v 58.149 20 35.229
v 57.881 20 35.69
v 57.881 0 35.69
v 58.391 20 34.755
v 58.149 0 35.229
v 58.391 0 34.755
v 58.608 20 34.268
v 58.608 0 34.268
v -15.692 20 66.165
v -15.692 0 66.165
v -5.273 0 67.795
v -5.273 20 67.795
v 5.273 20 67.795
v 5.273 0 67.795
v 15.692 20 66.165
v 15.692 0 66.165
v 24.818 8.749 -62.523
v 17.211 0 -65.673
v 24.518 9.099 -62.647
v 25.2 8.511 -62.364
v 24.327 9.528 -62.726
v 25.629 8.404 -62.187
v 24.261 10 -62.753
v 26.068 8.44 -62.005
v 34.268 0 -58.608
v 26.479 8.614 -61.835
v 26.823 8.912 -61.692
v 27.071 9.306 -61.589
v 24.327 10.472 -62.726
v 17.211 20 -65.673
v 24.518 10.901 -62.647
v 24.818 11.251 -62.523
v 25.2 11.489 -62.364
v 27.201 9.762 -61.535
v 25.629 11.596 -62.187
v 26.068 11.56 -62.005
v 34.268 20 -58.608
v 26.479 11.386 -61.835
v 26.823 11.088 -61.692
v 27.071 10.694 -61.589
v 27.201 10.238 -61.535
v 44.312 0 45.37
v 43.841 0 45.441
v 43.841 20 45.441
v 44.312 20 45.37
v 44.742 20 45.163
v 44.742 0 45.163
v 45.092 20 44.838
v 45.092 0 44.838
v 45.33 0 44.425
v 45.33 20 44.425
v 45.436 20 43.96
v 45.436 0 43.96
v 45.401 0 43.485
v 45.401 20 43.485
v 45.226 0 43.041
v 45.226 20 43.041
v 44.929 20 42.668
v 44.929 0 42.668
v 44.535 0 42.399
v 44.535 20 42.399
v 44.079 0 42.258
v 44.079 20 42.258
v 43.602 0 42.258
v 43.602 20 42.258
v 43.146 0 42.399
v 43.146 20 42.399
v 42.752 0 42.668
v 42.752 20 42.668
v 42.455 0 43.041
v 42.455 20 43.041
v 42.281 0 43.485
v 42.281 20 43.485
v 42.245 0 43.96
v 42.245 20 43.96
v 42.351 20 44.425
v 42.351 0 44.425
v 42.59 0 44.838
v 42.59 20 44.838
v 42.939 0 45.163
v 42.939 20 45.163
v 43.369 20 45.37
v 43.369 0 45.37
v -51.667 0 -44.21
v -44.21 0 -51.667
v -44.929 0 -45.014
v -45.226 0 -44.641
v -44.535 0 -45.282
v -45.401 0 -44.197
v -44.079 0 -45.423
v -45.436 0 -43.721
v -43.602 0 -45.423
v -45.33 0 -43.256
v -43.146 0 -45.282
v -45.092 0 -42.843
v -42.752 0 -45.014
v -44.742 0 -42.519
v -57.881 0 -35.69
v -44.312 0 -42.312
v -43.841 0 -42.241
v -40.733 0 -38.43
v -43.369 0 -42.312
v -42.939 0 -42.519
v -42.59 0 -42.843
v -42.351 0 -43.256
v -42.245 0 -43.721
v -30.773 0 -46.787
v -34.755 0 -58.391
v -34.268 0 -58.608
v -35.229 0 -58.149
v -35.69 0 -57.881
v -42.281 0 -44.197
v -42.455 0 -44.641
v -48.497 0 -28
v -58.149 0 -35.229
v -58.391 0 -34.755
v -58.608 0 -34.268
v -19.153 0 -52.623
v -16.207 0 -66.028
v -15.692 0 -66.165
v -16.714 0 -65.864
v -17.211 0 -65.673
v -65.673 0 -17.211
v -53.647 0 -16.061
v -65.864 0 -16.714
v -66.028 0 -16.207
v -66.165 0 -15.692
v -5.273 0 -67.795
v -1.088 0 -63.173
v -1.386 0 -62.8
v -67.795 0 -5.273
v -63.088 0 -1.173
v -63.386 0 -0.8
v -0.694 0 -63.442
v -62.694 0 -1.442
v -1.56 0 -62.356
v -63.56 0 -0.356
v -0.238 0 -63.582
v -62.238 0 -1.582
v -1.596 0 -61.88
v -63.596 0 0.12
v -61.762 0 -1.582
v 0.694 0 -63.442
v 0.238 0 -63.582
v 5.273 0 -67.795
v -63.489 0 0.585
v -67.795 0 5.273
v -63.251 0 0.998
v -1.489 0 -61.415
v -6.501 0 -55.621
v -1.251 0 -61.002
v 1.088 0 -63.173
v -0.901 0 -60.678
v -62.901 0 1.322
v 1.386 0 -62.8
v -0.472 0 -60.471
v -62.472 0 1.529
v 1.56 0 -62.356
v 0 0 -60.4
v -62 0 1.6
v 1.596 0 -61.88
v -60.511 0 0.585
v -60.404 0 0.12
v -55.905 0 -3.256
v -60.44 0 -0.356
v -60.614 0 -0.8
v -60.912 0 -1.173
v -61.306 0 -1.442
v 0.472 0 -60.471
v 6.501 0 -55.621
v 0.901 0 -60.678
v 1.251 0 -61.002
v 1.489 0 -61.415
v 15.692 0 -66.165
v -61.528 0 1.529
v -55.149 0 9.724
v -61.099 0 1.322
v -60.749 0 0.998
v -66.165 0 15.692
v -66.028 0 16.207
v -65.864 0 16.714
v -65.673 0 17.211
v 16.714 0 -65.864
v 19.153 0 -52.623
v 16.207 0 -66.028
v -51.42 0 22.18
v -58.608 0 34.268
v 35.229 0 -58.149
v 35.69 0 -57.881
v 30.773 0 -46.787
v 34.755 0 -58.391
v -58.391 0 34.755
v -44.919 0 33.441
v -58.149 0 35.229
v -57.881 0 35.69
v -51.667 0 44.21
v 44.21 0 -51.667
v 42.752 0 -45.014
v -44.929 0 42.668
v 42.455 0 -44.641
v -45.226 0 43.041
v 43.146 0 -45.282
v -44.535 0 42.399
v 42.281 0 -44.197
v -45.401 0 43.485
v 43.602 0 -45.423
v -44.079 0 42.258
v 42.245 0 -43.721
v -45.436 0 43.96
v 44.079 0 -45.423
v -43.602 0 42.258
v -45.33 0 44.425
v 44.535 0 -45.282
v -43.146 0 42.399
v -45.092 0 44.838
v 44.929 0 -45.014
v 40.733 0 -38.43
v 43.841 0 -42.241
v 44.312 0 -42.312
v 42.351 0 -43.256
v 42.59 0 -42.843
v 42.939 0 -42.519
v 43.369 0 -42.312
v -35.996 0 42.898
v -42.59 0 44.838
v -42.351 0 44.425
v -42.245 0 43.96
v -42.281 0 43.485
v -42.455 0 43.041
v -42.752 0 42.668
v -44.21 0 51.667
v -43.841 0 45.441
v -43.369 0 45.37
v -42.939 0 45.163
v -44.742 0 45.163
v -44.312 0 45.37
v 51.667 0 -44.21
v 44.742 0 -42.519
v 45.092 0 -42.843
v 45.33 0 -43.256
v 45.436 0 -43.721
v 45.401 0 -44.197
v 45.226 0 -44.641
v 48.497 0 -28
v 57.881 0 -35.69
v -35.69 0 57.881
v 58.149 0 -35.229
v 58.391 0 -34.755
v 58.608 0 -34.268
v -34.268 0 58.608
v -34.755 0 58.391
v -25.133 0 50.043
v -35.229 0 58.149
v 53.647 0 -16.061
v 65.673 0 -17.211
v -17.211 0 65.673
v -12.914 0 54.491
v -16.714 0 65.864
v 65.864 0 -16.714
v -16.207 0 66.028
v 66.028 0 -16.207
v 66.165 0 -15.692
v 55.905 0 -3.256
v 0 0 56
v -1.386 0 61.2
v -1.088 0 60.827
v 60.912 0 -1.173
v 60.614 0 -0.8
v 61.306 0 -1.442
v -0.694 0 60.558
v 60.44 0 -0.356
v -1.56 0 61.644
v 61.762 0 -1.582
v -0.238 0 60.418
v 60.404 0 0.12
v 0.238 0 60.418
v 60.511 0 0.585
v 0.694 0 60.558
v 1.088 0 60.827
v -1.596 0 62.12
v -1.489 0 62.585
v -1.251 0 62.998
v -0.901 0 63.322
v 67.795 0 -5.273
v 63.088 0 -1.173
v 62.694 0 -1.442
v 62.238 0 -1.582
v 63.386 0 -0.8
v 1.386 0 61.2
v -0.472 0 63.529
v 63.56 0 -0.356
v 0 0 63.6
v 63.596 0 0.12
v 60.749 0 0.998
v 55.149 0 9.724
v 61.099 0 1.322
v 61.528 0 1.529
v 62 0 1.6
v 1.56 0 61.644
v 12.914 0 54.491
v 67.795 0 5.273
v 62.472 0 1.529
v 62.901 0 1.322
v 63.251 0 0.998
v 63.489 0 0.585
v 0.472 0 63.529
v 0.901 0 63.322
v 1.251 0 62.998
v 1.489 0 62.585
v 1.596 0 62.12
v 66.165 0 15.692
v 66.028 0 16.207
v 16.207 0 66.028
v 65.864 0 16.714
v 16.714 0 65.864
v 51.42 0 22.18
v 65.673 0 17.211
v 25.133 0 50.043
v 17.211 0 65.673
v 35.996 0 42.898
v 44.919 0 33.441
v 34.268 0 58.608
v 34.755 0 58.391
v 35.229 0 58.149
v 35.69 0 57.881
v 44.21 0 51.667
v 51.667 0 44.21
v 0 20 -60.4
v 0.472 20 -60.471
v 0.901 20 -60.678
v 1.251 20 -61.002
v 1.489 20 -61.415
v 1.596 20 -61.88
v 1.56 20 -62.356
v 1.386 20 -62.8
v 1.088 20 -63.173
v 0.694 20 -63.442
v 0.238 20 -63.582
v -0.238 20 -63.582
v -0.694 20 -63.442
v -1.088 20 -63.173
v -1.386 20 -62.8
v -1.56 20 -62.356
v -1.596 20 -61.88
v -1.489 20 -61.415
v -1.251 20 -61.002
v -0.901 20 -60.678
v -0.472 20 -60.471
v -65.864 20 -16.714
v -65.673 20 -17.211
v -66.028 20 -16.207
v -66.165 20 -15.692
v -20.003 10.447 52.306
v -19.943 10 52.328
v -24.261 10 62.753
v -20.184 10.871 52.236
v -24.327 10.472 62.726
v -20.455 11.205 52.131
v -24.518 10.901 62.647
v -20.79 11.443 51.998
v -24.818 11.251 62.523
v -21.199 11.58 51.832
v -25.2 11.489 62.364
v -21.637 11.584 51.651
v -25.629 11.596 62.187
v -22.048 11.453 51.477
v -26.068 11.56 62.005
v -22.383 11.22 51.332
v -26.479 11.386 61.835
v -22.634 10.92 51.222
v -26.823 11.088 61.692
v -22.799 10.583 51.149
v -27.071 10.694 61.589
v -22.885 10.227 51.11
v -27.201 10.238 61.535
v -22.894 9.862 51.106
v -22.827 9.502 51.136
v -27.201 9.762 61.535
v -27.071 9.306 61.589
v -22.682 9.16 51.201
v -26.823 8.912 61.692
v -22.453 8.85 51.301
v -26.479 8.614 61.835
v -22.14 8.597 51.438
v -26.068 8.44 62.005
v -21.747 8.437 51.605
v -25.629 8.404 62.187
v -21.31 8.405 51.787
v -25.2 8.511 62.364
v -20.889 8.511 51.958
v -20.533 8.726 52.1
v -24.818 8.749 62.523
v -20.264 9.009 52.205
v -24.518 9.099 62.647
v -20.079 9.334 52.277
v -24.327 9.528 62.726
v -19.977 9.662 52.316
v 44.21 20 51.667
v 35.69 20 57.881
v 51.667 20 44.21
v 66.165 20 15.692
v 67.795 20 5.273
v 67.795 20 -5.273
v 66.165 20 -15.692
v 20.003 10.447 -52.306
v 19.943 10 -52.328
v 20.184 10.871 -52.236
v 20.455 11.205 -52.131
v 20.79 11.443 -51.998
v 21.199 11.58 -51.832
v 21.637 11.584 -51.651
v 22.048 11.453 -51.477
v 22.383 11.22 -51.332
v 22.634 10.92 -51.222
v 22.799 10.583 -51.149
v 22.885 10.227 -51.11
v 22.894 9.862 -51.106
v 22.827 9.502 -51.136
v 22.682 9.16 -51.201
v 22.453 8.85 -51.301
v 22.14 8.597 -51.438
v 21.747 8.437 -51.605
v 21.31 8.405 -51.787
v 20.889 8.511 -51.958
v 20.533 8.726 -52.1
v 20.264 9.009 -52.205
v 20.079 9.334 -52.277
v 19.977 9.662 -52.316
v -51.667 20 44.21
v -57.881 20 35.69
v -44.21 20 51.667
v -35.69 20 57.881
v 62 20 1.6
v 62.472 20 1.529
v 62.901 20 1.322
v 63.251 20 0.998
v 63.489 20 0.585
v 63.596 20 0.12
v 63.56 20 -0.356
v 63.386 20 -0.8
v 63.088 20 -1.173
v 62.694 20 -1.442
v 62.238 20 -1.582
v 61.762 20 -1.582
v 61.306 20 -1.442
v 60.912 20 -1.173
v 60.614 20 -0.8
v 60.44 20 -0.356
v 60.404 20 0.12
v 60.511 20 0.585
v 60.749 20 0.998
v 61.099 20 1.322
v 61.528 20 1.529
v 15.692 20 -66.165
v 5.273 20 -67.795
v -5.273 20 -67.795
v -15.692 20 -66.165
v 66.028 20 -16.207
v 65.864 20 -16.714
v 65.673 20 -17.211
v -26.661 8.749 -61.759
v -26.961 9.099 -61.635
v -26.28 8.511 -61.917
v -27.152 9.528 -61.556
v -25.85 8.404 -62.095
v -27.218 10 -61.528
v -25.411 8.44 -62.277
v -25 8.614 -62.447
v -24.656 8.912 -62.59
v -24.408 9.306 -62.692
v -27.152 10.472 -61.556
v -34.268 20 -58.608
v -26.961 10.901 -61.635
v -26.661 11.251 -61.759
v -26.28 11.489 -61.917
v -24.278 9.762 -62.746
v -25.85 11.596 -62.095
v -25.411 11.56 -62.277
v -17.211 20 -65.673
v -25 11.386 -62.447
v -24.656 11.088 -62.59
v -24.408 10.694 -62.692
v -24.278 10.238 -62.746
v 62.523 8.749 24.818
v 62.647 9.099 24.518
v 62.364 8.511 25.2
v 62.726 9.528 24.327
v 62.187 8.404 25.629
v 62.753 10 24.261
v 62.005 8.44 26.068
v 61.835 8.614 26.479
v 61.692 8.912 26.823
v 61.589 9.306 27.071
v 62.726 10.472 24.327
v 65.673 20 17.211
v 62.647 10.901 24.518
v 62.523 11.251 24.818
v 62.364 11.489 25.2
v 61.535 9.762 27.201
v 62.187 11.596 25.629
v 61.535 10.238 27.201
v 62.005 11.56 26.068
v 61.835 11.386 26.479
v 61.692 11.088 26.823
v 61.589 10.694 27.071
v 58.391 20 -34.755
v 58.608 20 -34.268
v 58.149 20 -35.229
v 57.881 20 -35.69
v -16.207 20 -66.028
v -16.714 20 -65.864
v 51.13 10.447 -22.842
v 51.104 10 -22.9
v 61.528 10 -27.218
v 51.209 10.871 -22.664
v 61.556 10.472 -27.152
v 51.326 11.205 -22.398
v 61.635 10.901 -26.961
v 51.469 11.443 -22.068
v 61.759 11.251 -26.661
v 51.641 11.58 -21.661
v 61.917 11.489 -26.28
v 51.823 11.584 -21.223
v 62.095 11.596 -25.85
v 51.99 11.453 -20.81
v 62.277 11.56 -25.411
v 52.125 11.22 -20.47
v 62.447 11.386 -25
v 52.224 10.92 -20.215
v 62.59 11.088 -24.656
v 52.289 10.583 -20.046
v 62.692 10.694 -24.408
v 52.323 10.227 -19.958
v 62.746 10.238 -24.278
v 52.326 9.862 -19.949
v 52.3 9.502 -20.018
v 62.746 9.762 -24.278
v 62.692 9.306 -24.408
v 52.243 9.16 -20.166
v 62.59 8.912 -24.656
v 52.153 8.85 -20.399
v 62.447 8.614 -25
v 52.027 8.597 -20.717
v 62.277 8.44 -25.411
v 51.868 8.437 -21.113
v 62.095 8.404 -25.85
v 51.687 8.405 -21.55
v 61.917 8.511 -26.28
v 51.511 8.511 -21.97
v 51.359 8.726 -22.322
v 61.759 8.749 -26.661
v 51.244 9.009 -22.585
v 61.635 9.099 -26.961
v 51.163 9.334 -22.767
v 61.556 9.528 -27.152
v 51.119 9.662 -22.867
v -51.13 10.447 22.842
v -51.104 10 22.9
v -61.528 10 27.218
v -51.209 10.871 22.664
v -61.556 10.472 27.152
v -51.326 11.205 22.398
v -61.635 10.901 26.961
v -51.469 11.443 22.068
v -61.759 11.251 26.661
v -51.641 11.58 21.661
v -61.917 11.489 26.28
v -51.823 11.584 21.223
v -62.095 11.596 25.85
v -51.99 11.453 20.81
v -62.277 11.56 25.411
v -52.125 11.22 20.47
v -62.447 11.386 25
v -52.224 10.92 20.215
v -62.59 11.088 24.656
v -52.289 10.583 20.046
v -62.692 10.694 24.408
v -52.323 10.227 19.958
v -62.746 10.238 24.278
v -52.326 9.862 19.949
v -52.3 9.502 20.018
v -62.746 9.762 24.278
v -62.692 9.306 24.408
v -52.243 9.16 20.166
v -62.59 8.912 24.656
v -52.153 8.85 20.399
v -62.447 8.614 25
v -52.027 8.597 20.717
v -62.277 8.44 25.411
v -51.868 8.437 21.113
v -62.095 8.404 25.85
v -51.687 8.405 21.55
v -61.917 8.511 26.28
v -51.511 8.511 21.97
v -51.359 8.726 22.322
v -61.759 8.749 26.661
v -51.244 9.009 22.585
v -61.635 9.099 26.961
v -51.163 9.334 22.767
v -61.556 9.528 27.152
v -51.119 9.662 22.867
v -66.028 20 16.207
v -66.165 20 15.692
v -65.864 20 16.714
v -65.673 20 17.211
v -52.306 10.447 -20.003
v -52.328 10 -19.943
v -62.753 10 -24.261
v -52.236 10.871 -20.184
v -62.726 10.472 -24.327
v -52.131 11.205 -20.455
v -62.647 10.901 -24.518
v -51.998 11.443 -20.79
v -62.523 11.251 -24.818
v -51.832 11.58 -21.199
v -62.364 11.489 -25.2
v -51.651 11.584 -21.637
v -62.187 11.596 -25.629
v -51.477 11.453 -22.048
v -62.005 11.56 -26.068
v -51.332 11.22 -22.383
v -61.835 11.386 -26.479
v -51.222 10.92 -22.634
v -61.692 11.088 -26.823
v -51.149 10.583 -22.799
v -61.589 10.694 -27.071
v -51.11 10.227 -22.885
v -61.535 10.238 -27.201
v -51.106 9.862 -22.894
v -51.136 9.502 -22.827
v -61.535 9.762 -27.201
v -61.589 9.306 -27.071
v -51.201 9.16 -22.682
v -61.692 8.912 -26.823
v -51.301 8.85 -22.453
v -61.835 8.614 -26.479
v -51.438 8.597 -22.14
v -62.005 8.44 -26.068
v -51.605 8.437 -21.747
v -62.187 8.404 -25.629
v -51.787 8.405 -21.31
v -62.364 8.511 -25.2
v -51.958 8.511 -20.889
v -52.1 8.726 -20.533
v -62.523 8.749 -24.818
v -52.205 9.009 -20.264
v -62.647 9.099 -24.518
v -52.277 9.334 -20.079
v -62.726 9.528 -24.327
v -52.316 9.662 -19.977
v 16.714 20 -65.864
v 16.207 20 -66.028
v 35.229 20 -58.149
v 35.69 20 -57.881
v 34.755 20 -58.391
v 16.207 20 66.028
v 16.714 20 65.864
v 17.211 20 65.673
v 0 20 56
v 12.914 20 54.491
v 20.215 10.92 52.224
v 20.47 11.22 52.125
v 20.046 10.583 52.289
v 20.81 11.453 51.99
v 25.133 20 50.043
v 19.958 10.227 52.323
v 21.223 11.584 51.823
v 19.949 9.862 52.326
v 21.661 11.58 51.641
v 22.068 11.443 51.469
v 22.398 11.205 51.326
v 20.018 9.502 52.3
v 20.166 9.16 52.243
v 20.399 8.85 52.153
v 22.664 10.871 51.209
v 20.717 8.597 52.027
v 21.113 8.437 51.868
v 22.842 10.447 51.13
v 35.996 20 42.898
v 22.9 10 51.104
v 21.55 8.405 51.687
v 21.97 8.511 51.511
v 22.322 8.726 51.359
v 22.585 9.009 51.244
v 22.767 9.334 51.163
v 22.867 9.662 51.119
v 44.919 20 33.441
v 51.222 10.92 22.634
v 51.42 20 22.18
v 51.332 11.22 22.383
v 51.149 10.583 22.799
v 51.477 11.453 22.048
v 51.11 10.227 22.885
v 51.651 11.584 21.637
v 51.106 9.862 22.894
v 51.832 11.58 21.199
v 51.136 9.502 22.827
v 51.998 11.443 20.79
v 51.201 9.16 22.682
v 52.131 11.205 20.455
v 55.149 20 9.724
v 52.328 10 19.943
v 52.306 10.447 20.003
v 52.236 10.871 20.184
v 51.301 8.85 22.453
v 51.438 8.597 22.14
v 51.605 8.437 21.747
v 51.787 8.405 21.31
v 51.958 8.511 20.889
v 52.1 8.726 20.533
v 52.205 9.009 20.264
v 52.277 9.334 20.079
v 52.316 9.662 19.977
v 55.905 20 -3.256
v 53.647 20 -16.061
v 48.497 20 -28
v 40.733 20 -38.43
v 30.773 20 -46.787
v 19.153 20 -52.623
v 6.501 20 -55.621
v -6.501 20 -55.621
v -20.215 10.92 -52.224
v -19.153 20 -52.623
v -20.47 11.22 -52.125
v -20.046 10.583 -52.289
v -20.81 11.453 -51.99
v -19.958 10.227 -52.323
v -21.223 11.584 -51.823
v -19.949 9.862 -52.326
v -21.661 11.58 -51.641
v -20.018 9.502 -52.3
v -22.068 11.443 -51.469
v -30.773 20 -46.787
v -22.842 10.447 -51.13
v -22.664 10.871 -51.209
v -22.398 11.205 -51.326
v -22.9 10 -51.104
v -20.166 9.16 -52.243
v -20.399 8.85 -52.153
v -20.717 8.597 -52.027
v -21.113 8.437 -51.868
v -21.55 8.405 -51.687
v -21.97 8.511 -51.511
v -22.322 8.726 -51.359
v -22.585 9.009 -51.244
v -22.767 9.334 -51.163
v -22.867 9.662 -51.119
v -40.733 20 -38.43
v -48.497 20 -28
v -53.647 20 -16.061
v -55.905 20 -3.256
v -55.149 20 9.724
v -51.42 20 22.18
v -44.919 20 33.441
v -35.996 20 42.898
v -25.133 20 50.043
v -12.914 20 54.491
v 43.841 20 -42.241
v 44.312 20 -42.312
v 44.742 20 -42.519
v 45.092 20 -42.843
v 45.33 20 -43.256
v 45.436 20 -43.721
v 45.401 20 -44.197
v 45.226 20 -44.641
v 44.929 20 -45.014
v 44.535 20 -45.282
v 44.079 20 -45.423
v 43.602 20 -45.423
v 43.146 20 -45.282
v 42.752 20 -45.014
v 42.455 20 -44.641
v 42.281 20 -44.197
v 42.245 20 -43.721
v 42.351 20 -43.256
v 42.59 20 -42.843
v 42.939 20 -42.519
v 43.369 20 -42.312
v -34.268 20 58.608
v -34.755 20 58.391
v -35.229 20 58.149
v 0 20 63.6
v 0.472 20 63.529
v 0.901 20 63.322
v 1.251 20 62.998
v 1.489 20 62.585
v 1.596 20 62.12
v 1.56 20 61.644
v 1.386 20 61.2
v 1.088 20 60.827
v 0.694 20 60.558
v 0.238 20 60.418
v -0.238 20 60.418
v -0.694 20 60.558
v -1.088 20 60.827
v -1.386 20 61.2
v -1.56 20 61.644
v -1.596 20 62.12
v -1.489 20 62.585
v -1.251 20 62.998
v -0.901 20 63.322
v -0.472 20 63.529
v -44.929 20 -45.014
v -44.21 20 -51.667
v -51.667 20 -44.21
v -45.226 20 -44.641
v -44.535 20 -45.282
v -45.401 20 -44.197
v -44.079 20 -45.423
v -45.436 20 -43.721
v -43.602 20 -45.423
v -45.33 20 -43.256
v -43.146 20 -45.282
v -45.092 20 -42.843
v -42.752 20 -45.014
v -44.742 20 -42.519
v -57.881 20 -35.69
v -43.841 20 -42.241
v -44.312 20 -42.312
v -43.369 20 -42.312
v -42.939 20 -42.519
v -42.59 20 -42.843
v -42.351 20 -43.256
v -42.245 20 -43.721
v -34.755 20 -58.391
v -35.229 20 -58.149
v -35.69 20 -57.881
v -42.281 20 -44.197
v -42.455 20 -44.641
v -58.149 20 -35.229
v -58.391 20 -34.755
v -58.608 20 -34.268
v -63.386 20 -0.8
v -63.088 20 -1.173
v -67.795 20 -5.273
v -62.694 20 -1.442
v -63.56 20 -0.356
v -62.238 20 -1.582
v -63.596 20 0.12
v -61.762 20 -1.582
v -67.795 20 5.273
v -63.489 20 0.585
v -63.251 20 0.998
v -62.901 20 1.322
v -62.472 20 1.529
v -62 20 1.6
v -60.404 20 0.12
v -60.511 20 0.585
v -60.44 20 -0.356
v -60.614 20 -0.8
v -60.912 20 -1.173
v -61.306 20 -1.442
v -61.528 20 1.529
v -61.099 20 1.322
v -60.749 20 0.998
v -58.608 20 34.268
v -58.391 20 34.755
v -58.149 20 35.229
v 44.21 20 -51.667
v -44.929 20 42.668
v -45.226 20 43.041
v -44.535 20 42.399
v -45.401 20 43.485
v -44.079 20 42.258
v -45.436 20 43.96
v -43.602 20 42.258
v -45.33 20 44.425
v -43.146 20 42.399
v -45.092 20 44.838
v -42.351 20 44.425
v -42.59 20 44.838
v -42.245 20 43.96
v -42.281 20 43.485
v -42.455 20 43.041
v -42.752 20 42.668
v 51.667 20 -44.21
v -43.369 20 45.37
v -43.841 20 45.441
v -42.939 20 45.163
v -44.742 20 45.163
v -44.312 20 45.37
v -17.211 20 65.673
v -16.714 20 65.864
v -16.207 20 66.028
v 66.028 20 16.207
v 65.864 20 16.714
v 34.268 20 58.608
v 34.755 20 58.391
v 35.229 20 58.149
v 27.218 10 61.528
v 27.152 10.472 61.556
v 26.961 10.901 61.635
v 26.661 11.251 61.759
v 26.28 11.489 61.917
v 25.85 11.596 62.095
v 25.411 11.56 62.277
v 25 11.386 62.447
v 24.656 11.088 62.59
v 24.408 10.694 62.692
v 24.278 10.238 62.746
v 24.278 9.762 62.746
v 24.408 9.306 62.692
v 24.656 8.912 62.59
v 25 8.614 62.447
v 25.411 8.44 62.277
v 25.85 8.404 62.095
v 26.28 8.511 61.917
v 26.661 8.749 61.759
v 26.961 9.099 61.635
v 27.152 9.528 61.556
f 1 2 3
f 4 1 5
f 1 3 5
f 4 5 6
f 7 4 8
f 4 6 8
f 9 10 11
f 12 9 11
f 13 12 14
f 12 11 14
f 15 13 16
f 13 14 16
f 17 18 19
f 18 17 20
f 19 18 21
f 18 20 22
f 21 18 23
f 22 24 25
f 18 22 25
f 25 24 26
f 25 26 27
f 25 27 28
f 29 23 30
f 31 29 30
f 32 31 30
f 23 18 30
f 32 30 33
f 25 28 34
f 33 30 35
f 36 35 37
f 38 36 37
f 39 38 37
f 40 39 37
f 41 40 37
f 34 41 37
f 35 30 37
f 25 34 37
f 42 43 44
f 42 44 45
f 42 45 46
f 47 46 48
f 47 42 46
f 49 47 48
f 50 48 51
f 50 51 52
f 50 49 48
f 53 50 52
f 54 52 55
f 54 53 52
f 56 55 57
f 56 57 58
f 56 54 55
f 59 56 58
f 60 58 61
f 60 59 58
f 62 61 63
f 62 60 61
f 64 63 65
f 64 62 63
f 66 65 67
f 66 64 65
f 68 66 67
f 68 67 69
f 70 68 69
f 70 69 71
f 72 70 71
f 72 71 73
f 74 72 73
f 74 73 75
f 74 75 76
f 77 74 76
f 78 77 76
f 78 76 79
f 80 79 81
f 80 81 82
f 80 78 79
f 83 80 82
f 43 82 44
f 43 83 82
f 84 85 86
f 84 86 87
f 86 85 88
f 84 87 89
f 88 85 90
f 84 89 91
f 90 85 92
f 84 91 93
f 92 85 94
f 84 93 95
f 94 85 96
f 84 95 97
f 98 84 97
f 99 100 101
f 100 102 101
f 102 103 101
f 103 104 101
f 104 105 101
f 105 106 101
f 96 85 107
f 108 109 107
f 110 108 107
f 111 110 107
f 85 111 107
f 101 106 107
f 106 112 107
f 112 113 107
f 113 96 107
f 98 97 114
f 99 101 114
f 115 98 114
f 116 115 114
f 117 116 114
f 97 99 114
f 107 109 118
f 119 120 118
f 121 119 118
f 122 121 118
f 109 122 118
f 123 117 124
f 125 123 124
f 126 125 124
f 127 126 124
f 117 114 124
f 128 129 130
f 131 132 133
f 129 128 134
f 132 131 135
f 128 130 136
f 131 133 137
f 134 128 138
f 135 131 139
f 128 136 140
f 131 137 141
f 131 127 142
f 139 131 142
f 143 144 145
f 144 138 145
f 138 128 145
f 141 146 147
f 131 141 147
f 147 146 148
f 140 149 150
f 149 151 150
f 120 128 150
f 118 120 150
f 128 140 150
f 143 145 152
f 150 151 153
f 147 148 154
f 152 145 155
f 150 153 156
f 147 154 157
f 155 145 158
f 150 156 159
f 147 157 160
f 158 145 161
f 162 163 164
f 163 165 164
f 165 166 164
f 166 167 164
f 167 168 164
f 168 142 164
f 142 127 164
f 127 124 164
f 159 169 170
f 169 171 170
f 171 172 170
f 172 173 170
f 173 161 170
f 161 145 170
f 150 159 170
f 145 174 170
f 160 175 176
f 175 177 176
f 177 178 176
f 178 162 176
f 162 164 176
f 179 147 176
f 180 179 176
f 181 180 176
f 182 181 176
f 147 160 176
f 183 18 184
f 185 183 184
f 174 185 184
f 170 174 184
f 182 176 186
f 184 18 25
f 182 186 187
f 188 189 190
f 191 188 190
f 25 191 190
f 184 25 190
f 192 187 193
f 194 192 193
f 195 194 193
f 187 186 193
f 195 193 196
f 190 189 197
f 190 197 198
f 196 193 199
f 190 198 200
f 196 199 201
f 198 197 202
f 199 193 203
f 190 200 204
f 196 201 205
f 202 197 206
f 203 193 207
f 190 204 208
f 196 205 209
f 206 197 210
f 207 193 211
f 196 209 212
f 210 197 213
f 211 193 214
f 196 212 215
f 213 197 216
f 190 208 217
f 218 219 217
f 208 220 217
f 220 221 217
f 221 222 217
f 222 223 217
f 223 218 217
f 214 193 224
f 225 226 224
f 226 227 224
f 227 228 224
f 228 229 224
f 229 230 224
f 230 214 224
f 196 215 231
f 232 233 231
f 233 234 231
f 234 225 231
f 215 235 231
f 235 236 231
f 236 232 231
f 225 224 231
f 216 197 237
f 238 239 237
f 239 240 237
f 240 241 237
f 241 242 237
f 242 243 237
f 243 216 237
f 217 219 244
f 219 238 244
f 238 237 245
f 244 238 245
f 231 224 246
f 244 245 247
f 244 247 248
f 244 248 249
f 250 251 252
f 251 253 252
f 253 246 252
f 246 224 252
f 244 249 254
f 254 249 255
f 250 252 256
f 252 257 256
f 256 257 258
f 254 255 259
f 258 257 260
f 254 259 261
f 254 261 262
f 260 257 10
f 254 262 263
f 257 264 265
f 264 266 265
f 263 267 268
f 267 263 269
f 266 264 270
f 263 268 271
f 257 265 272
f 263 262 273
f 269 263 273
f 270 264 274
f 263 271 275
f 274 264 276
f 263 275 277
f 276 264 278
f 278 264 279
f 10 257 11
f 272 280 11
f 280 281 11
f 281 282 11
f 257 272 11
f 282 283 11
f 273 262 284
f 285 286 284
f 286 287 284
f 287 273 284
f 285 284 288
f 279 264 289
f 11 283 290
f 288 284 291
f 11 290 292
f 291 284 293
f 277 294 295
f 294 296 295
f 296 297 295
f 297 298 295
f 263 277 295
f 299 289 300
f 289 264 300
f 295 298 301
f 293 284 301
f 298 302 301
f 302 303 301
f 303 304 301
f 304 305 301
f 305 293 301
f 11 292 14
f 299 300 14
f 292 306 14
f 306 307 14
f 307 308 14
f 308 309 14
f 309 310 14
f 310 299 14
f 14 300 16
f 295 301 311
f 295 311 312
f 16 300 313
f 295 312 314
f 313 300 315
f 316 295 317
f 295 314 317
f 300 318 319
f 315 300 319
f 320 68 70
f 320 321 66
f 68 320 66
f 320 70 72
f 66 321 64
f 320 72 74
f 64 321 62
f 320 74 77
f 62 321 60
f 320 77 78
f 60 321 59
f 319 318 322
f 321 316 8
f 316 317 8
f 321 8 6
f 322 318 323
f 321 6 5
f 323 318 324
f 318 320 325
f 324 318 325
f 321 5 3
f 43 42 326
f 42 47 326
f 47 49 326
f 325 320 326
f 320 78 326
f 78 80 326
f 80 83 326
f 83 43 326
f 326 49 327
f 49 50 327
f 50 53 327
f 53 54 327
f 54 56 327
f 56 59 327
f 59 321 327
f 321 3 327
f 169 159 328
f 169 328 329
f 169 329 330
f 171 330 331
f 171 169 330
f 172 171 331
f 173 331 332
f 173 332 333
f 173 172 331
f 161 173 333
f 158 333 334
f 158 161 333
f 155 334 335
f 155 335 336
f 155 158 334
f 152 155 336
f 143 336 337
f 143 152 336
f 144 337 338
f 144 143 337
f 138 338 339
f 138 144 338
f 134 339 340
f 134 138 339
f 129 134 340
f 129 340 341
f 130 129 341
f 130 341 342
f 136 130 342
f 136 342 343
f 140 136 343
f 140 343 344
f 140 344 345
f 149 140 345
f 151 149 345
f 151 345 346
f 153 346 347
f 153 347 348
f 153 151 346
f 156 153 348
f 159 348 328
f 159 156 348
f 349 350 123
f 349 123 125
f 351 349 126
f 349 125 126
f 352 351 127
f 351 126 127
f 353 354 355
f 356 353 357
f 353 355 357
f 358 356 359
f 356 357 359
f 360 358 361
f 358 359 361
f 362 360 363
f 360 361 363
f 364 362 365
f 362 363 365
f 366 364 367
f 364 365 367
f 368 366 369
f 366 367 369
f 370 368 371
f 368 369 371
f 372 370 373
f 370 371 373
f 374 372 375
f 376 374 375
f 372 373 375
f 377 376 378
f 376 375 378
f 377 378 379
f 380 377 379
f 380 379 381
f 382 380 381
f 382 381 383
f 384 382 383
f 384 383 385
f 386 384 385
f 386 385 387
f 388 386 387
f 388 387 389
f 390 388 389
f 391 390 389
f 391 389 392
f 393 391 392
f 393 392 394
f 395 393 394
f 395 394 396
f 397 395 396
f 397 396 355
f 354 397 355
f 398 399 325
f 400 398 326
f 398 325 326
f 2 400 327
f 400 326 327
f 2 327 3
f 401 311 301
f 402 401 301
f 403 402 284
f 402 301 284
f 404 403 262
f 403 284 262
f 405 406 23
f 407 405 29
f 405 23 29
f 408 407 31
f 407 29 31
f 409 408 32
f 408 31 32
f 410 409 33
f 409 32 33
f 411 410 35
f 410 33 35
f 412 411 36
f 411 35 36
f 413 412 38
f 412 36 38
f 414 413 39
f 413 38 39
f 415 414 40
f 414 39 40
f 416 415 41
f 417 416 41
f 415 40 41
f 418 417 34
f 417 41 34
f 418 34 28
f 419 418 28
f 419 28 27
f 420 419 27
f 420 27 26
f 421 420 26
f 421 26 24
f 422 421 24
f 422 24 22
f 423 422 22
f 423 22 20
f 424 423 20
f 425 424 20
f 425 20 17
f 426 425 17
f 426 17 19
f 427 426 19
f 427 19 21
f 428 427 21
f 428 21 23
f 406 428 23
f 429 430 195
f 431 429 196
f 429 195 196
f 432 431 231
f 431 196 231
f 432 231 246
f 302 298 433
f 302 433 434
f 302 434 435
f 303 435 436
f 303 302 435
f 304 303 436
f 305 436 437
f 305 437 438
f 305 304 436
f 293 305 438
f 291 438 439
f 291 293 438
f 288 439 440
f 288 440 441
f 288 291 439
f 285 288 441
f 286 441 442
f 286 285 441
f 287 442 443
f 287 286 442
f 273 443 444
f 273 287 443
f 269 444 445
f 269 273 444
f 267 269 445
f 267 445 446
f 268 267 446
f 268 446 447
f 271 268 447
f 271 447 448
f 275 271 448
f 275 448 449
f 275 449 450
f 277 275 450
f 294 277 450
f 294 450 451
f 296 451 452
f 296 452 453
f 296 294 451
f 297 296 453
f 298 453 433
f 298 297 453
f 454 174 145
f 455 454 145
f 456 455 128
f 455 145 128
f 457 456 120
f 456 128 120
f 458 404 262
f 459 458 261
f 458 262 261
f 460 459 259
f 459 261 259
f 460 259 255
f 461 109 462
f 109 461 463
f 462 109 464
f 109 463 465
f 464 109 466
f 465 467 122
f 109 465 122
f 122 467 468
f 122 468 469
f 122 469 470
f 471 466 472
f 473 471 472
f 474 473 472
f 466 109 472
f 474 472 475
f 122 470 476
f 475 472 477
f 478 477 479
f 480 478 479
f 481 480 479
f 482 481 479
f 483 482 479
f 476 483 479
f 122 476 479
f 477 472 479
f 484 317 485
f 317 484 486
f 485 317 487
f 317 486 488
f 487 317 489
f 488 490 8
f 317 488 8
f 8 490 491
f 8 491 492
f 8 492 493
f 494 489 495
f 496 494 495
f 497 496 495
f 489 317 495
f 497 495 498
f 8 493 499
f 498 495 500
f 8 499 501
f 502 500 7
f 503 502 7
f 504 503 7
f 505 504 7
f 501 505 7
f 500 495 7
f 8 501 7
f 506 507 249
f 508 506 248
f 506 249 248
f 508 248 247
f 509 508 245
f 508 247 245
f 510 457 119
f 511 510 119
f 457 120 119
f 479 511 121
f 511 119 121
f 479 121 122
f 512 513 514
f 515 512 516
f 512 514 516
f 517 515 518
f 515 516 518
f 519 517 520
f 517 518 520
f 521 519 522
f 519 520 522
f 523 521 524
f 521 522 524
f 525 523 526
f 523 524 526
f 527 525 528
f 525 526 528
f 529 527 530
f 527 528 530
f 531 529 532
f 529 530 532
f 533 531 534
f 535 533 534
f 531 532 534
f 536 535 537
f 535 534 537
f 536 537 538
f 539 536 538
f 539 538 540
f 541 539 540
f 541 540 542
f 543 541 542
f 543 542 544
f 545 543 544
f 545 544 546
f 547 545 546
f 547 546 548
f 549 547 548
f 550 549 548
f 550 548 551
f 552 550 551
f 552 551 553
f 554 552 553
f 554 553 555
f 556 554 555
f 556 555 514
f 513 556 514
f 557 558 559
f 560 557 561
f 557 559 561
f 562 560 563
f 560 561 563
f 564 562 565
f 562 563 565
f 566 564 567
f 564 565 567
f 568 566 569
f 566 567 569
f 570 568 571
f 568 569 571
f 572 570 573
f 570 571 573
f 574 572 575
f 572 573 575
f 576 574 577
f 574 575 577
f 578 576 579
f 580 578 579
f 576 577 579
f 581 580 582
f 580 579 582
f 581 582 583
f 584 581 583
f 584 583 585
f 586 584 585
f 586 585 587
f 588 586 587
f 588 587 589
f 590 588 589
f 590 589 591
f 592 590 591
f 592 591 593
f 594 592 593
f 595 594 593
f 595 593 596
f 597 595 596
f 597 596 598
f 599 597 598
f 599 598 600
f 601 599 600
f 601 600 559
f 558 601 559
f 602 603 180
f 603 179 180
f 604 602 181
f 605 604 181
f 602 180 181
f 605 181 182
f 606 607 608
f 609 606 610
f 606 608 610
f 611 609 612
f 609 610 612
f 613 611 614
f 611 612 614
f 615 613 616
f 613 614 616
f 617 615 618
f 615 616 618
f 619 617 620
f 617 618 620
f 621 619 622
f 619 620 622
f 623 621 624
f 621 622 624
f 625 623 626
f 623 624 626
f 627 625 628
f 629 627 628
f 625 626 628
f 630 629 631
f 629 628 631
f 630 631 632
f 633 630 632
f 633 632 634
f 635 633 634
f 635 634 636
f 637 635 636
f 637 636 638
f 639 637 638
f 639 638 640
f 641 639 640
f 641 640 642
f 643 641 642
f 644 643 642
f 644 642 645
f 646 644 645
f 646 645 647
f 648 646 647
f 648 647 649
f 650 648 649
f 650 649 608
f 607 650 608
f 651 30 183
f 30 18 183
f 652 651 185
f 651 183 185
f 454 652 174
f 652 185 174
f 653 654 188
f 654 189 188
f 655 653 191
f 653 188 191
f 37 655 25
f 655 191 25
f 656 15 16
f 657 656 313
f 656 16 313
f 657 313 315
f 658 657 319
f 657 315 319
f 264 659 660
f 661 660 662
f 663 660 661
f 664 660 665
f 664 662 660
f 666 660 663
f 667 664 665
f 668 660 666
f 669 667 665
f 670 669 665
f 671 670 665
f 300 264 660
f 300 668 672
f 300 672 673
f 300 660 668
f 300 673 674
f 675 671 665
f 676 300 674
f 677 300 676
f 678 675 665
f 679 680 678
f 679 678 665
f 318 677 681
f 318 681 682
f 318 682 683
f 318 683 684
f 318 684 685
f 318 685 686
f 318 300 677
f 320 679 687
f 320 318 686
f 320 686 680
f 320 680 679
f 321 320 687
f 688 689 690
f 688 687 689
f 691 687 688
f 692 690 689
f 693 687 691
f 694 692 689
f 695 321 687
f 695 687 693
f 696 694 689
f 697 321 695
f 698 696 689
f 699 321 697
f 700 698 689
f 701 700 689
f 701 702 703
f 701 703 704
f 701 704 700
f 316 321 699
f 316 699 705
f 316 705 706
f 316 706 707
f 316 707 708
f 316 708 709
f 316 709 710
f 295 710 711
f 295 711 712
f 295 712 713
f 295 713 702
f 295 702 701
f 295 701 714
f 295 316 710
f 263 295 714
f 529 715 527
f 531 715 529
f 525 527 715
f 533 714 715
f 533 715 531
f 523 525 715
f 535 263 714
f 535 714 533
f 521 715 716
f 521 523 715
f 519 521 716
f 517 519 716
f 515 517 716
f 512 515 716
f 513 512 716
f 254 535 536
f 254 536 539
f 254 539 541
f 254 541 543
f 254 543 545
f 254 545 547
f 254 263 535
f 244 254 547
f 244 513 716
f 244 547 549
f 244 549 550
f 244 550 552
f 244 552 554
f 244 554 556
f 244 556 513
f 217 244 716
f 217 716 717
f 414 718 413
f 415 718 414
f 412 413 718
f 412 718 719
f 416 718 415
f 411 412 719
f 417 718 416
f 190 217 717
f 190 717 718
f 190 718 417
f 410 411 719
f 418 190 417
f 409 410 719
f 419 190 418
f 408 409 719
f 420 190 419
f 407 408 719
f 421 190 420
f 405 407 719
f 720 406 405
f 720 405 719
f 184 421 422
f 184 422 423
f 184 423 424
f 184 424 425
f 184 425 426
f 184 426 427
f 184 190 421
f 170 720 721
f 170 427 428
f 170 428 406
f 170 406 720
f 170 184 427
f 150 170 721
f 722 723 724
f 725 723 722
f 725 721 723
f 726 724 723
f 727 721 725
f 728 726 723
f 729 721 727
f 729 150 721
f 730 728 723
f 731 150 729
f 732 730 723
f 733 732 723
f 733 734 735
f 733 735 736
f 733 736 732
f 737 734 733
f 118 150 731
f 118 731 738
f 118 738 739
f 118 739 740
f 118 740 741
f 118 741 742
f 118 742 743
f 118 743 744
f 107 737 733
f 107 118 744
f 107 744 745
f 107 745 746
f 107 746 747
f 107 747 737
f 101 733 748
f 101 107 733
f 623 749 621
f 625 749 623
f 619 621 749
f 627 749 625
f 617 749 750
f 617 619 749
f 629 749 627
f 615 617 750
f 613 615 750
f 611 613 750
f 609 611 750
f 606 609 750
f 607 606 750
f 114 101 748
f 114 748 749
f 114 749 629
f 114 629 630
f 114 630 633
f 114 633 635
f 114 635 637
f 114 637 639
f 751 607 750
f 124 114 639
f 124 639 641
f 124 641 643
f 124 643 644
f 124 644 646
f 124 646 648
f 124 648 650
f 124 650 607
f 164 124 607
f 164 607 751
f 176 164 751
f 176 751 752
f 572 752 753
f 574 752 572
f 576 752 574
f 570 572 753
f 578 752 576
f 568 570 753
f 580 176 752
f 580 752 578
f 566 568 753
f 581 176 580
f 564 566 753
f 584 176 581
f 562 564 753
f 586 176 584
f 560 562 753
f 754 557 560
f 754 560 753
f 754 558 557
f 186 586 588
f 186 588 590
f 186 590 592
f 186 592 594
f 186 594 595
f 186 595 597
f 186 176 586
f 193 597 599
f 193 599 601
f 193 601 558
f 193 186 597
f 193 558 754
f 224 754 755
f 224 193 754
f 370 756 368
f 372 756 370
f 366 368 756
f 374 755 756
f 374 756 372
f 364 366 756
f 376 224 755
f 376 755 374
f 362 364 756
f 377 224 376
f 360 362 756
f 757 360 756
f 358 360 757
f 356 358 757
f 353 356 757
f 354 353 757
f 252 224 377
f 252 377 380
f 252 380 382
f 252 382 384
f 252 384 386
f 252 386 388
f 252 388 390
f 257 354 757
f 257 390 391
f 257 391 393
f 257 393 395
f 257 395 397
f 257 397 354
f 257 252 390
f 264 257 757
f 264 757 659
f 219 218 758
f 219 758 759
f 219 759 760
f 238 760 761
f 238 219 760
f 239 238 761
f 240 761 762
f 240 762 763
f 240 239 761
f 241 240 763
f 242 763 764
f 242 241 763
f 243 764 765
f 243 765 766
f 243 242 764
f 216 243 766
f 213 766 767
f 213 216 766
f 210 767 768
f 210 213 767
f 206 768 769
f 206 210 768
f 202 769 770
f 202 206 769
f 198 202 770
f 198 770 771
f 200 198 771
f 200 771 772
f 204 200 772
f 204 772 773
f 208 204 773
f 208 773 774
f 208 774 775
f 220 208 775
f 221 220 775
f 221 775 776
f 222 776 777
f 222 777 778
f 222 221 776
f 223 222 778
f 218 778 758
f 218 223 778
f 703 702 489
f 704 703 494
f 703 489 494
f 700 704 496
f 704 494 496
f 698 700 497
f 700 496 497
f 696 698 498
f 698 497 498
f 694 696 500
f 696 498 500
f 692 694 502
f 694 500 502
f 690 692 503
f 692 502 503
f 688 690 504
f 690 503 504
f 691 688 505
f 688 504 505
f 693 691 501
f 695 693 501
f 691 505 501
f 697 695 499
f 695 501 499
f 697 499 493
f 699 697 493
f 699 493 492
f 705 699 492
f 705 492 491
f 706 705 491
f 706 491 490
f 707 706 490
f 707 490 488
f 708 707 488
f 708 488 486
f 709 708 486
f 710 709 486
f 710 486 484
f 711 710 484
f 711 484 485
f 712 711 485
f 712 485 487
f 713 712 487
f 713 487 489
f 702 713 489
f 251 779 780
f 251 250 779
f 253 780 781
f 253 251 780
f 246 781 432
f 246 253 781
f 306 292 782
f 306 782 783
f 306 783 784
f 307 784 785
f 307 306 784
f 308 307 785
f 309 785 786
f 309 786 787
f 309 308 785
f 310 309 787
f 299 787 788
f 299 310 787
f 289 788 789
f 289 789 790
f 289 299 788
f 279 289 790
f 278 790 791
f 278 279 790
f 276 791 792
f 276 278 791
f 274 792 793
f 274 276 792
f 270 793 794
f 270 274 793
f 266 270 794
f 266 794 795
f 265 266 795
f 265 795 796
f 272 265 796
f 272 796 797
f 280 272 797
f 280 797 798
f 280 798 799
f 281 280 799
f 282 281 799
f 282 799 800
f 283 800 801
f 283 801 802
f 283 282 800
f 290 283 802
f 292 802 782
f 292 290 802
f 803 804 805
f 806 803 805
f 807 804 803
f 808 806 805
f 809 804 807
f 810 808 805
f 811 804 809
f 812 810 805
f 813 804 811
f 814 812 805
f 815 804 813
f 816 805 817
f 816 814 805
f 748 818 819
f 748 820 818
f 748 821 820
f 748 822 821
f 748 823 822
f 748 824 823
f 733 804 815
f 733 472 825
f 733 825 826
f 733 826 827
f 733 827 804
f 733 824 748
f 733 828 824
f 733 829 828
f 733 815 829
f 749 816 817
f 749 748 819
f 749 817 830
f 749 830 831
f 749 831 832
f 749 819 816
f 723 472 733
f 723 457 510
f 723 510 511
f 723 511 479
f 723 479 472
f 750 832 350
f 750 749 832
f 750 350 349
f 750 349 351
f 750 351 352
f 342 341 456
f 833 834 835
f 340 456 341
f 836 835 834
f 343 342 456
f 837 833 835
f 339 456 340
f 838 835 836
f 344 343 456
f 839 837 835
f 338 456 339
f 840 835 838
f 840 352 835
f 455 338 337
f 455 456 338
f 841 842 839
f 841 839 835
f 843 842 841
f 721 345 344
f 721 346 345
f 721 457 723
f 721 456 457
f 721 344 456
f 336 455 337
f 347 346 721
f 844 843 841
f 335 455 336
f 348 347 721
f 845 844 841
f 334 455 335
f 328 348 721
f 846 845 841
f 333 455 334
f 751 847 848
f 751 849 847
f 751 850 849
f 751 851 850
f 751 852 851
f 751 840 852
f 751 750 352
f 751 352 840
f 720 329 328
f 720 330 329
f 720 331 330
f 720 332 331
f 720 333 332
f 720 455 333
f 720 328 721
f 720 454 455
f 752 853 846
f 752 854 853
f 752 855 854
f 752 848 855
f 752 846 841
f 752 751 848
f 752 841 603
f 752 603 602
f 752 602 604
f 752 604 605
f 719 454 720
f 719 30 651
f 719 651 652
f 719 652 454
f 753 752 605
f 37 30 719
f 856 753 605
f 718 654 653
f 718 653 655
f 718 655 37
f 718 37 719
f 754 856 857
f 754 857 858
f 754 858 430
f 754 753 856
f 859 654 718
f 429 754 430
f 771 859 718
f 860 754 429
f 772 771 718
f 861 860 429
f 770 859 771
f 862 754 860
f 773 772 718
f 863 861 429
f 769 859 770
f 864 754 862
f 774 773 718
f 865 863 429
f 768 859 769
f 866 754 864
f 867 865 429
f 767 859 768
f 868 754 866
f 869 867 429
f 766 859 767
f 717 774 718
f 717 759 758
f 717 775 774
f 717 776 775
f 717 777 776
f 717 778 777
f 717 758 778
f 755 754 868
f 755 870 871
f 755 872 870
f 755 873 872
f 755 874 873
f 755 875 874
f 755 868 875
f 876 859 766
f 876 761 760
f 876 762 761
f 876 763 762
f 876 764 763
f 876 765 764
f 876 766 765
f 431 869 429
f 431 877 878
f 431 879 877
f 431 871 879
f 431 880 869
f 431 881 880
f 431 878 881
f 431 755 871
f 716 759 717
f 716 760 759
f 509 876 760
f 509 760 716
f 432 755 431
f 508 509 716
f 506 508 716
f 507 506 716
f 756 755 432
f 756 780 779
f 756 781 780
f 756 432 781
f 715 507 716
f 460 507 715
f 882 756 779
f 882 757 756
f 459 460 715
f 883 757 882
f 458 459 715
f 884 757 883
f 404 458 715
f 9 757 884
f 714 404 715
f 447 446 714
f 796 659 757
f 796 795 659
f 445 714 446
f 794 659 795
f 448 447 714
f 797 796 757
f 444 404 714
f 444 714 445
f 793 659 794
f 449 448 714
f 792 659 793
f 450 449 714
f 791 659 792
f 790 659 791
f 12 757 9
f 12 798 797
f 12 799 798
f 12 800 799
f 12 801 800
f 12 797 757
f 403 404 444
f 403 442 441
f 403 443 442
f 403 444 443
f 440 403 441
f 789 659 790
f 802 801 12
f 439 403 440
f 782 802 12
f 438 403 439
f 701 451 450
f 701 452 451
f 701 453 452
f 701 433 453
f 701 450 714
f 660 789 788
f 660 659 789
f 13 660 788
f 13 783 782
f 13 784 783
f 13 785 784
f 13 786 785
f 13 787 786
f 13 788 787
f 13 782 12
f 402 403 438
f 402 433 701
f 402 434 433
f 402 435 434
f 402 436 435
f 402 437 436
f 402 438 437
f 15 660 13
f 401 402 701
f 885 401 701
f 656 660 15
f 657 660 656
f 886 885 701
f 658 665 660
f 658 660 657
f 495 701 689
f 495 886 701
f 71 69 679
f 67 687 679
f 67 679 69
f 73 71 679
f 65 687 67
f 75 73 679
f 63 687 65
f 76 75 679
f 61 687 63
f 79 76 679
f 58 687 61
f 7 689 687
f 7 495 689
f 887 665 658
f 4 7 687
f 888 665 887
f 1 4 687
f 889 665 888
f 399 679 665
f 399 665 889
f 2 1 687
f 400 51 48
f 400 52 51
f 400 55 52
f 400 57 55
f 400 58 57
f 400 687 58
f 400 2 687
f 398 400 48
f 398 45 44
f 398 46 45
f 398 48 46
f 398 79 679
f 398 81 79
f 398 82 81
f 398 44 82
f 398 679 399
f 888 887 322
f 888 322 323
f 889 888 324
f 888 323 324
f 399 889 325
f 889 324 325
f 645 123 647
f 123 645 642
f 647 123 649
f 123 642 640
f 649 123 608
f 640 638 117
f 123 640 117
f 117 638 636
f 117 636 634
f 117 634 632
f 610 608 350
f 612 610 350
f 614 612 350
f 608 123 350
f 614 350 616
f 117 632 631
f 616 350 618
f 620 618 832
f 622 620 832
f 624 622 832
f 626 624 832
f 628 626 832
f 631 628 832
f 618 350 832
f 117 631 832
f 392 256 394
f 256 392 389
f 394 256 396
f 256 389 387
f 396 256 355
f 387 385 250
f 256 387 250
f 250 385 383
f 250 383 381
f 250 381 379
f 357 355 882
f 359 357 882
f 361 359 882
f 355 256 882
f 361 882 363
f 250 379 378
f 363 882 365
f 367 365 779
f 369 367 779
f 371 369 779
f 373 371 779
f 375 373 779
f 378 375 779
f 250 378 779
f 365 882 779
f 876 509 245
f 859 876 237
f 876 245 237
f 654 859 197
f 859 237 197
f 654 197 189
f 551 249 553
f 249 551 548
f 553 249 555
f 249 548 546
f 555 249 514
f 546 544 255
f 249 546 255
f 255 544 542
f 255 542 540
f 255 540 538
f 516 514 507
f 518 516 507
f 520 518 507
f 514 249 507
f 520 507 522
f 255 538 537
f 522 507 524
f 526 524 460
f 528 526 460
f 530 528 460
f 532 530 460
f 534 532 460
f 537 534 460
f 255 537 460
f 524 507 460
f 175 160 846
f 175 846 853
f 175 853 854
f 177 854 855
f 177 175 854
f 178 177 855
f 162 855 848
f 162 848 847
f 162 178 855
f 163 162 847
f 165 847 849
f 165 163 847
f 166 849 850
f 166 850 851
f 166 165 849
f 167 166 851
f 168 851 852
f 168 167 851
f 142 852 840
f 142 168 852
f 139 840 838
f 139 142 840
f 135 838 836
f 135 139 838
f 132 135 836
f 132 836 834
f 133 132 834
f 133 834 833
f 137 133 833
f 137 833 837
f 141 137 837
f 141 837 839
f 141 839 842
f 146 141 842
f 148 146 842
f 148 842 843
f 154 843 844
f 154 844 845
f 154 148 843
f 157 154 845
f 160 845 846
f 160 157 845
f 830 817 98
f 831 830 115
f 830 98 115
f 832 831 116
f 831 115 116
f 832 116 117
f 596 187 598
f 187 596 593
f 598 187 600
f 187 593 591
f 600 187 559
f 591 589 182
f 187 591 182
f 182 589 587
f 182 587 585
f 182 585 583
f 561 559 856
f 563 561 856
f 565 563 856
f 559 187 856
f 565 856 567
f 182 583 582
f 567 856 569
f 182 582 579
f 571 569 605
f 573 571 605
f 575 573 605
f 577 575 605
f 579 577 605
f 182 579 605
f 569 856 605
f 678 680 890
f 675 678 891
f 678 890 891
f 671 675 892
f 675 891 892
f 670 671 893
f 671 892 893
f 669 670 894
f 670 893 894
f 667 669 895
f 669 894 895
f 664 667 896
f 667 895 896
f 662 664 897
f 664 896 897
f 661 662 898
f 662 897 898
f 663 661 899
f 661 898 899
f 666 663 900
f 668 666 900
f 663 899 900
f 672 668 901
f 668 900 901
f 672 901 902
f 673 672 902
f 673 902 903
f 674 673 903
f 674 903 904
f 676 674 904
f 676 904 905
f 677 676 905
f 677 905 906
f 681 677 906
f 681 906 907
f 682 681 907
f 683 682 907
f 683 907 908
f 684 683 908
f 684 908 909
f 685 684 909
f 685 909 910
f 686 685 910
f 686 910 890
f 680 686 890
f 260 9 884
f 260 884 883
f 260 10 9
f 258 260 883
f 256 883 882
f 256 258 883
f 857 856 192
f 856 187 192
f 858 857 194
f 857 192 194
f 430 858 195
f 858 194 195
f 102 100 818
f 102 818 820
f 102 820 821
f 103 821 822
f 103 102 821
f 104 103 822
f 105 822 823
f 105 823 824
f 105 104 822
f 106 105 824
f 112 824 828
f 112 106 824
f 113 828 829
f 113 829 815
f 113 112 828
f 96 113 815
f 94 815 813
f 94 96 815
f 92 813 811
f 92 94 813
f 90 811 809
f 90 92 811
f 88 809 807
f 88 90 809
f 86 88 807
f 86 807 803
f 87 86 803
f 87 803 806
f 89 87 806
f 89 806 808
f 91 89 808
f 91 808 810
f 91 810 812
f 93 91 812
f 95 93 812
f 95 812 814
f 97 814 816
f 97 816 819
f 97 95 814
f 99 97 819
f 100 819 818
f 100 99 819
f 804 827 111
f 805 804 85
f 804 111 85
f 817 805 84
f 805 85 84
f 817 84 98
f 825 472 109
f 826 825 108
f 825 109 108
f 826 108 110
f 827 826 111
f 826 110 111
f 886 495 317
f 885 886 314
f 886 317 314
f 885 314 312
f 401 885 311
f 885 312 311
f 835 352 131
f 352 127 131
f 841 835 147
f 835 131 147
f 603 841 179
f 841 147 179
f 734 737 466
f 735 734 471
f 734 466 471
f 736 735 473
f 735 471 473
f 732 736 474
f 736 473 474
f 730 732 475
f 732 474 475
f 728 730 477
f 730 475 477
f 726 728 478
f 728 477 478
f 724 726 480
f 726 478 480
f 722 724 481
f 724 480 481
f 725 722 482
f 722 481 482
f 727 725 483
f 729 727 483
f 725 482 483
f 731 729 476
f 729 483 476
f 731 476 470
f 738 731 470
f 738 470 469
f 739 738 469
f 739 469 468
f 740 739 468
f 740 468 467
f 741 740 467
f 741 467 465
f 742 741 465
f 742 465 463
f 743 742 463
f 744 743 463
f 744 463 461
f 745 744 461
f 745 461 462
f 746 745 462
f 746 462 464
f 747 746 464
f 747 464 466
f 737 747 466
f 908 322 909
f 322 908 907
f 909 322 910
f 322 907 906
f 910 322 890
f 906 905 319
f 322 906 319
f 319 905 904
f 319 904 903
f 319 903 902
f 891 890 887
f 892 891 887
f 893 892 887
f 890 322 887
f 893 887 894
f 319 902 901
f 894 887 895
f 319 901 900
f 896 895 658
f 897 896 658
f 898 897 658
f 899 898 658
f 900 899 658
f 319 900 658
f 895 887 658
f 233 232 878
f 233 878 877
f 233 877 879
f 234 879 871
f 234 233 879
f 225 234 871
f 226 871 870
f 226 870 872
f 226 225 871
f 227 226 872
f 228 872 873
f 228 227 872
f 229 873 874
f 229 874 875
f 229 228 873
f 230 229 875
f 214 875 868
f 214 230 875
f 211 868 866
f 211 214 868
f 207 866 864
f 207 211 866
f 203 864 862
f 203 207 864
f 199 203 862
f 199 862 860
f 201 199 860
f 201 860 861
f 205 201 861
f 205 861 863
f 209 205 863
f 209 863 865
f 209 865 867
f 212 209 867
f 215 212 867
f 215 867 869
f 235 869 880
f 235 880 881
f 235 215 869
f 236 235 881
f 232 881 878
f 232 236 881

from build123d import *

# Parameters (mm, degrees)
SKETCH1_R               = 68
SKETCH1_R_2             = 56
SKETCH1_R_3             = 1.6
BOSS_EXTRUDE1_DEPTH     = 20
SKETCH2_R               = 76
CUT_EXTRUDE1_DEPTH      = 99.224233262
CUT_EXTRUDE2_REACH      = 163.628
CUT_EXTRUDE2_END_RADIUS = 56
SKETCH3_R               = 1.6
CIRPATTERN4_COUNT       = 8
FILLET1_R               = 10


with BuildPart() as part:
    # Sketch1 → Boss-Extrude1 (new body)
    with BuildSketch(Plane(origin=(0, 0, 0), x_dir=(1, 0, 0), z_dir=(0, 1, 0))):
        with Locations(Location((0, 0, 0), (0, 0, 270))):
            Circle(SKETCH1_R)
        with Locations(Location((0, 0, 0), (0, 0, 270))):
            Circle(SKETCH1_R_2, mode=Mode.SUBTRACT)
        with Locations(Location((0, 62, 0), (0, 0, 270))):
            Circle(SKETCH1_R_3, mode=Mode.SUBTRACT)
        with Locations(Location((43.840620434, 43.840620434, 0), (0, 0, 270))):
            Circle(SKETCH1_R_3, mode=Mode.SUBTRACT)
        with Locations(Location((62, 0, 0), (0, 0, 270))):
            Circle(SKETCH1_R_3, mode=Mode.SUBTRACT)
        with Locations(Location((43.840620434, -43.840620434, 0), (0, 0, 270))):
            Circle(SKETCH1_R_3, mode=Mode.SUBTRACT)
        with Locations(Location((0, -62, 0), (0, 0, 270))):
            Circle(SKETCH1_R_3, mode=Mode.SUBTRACT)
        with Locations(Location((-43.840620434, -43.840620434, 0), (0, 0, 270))):
            Circle(SKETCH1_R_3, mode=Mode.SUBTRACT)
        with Locations(Location((-62, 0, 0), (0, 0, 270))):
            Circle(SKETCH1_R_3, mode=Mode.SUBTRACT)
        with Locations(Location((-43.840620434, 43.840620434, 0), (0, 0, 270))):
            Circle(SKETCH1_R_3, mode=Mode.SUBTRACT)
    extrude(amount=BOSS_EXTRUDE1_DEPTH)

    # Sketch2 → Cut-Extrude1 (cut, through all)
    with BuildSketch(Plane(origin=(0, 20, 0), x_dir=(1, 0, 0), z_dir=(0, 1, 0))):
        Circle(SKETCH2_R)
        with BuildLine():
            Line((16.500755195, 65.967606278), (34.978345845, 58.31393763))
            ThreePointArc((34.978345845, 58.31393763), (48.083261121, 48.083261121), (58.31393763, 34.978345845))
            Line((58.31393763, 34.978345845), (65.967606278, 16.500755195))
            ThreePointArc((65.967606278, 16.500755195), (68, 0), (65.967606278, -16.500755195))
            Line((65.967606278, -16.500755195), (58.31393763, -34.978345845))
            ThreePointArc((58.31393763, -34.978345845), (48.083261121, -48.083261121), (34.978345845, -58.31393763))
            Line((34.978345845, -58.31393763), (16.500755195, -65.967606278))
            ThreePointArc((16.500755195, -65.967606278), (0, -68), (-16.500755195, -65.967606278))
            Line((-16.500755195, -65.967606278), (-34.978345845, -58.31393763))
            ThreePointArc((-34.978345845, -58.31393763), (-48.083261121, -48.083261121), (-58.31393763, -34.978345845))
            Line((-58.31393763, -34.978345845), (-65.967606278, -16.500755195))
            ThreePointArc((-65.967606278, -16.500755195), (-68, 0), (-65.967606278, 16.500755195))
            Line((-65.967606278, 16.500755195), (-58.31393763, 34.978345845))
            ThreePointArc((-58.31393763, 34.978345845), (-48.083261121, 48.083261121), (-34.978345845, 58.31393763))
            Line((-34.978345845, 58.31393763), (-16.500755195, 65.967606278))
            ThreePointArc((-16.500755195, 65.967606278), (0, 68), (16.500755195, 65.967606278))
        make_face(mode=Mode.SUBTRACT)
    extrude(amount=-CUT_EXTRUDE1_DEPTH, mode=Mode.SUBTRACT)

    # Cut-Extrude2: up to this cylinder (the profile starts outside it)
    cut_extrude2_end = Plane(origin=(0, 10, 0), z_dir=(0, -1, 0)) * Cylinder(CUT_EXTRUDE2_END_RADIUS, 440.256, mode=Mode.PRIVATE)
    # Sketch3 → Cut-Extrude2 (cut, up to the surface)
    with BuildSketch(Plane(origin=(-25.73955052, 0, -62.140771954), x_dir=(-0.9238795325112866, 0, 0.38268343236509017), z_dir=(-0.3826834323650902, 0, -0.9238795325112867)), mode=Mode.PRIVATE) as cut_extrude2_sk1:
        with Locations((0, 10)):
            Circle(SKETCH3_R)
    cut_extrude2_tool1 = extrude(cut_extrude2_sk1.sketch, amount=-CUT_EXTRUDE2_REACH, mode=Mode.PRIVATE) - cut_extrude2_end
    cut_extrude2 = cut_extrude2_tool1.solids().sort_by_distance((-25.739551, 10, -62.140772))[0]
    add(cut_extrude2, mode=Mode.SUBTRACT)

    # CirPattern4: Cut-Extrude2 ×8 about axis
    cirpattern4_axis = Axis((0, 20, 0), (0, 1, 0))
    for i in range(1, CIRPATTERN4_COUNT):
        add(cut_extrude2.rotate(cirpattern4_axis, i * 360 / CIRPATTERN4_COUNT), mode=Mode.SUBTRACT)

    # Fillet1
    fillet1_edges = [part.edges().sort_by_distance(p)[0] for p in [
        (16.500755195, 10, -65.967606278),
        (34.978345845, 10, -58.31393763),
        (58.31393763, 10, -34.978345845),
        (65.967606278, 10, -16.500755195),
        (65.967606278, 10, 16.500755195),
        (58.31393763, 10, 34.978345845),
        (34.978345845, 10, 58.31393763),
        (16.500755195, 10, 65.967606278),
        (-16.500755195, 10, 65.967606278),
        (-34.978345845, 10, 58.31393763),
        (-58.31393763, 10, 34.978345845),
        (-65.967606278, 10, 16.500755195),
        (-65.967606278, 10, -16.500755195),
        (-58.31393763, 10, -34.978345845),
        (-34.978345845, 10, -58.31393763),
        (-16.500755195, 10, -65.967606278),
    ]]
    fillet(fillet1_edges, radius=FILLET1_R)


solid = part.part
